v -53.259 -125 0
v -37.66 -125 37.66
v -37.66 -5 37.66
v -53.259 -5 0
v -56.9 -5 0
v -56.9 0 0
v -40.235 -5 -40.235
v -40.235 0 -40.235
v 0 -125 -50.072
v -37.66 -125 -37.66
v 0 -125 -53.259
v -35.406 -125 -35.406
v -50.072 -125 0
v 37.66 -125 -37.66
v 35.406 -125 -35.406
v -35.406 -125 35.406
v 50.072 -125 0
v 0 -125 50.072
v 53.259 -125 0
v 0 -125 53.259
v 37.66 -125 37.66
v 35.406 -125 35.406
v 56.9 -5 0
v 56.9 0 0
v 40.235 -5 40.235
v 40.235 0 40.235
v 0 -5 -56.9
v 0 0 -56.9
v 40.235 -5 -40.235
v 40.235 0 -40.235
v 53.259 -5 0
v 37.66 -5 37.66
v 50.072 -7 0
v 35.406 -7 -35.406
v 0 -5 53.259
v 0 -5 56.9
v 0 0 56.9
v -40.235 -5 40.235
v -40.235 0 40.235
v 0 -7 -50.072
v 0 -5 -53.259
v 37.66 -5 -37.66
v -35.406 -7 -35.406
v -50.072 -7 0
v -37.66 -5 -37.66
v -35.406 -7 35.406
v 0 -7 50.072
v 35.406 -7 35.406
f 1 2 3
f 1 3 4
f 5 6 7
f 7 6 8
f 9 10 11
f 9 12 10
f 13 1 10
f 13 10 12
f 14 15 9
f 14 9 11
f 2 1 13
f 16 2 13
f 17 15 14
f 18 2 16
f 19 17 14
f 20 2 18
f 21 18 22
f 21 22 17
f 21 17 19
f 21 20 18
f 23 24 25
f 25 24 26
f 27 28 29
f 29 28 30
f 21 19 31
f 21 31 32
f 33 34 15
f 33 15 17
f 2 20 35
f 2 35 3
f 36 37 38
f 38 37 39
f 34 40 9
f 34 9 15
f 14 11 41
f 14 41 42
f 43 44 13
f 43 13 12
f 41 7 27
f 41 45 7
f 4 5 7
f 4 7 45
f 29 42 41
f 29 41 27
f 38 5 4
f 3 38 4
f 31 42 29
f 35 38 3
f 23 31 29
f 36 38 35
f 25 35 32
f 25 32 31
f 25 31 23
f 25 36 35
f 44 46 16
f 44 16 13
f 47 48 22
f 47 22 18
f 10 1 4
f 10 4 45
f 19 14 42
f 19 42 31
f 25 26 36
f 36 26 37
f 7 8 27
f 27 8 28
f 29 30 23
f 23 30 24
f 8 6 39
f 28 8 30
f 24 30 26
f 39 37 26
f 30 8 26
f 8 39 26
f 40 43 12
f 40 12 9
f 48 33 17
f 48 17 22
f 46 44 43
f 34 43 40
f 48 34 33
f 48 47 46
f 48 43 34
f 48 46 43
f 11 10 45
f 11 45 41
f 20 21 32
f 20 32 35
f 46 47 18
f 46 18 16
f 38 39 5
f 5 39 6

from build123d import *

# Parameters (mm, degrees)
F2_DEPTH = 5
F4_DEPTH = 120
F6_DEPTH = 118


with BuildPart() as f2:
    # F0 (on Front) → F2 (new body)
    with BuildSketch(Plane.XZ):
        Polygon((40.23458, -40.23458), (56.900289, 0), (40.23458, 40.23458), (0, 56.900289), (-40.23458, 40.23458), (-56.900289, 0), (-40.23458, -40.23458), (0, -56.900289), align=None)
    extrude(amount=F2_DEPTH)

    # F3 (on offset) → F4 (join)
    with BuildSketch(Plane.XZ.offset(5)):
        Polygon((37.659568, -37.659568), (53.258672, 0), (37.659568, 37.659568), (0, 53.258672), (-37.659568, 37.659568), (-53.258672, 0), (-37.659568, -37.659568), (0, -53.258672), align=None)
    extrude(amount=F4_DEPTH)

    # F5 (on face) → F6 (cut)
    with BuildSketch(Plane.XZ.offset(125)):
        Polygon((35.406429, -35.406429), (50.072253, 0), (35.406429, 35.406429), (0, 50.072253), (-35.406429, 35.406429), (-50.072253, 0), (-35.406429, -35.406429), (0, -50.072253), align=None)
    extrude(amount=-F6_DEPTH, mode=Mode.SUBTRACT)


solid = f2.part
